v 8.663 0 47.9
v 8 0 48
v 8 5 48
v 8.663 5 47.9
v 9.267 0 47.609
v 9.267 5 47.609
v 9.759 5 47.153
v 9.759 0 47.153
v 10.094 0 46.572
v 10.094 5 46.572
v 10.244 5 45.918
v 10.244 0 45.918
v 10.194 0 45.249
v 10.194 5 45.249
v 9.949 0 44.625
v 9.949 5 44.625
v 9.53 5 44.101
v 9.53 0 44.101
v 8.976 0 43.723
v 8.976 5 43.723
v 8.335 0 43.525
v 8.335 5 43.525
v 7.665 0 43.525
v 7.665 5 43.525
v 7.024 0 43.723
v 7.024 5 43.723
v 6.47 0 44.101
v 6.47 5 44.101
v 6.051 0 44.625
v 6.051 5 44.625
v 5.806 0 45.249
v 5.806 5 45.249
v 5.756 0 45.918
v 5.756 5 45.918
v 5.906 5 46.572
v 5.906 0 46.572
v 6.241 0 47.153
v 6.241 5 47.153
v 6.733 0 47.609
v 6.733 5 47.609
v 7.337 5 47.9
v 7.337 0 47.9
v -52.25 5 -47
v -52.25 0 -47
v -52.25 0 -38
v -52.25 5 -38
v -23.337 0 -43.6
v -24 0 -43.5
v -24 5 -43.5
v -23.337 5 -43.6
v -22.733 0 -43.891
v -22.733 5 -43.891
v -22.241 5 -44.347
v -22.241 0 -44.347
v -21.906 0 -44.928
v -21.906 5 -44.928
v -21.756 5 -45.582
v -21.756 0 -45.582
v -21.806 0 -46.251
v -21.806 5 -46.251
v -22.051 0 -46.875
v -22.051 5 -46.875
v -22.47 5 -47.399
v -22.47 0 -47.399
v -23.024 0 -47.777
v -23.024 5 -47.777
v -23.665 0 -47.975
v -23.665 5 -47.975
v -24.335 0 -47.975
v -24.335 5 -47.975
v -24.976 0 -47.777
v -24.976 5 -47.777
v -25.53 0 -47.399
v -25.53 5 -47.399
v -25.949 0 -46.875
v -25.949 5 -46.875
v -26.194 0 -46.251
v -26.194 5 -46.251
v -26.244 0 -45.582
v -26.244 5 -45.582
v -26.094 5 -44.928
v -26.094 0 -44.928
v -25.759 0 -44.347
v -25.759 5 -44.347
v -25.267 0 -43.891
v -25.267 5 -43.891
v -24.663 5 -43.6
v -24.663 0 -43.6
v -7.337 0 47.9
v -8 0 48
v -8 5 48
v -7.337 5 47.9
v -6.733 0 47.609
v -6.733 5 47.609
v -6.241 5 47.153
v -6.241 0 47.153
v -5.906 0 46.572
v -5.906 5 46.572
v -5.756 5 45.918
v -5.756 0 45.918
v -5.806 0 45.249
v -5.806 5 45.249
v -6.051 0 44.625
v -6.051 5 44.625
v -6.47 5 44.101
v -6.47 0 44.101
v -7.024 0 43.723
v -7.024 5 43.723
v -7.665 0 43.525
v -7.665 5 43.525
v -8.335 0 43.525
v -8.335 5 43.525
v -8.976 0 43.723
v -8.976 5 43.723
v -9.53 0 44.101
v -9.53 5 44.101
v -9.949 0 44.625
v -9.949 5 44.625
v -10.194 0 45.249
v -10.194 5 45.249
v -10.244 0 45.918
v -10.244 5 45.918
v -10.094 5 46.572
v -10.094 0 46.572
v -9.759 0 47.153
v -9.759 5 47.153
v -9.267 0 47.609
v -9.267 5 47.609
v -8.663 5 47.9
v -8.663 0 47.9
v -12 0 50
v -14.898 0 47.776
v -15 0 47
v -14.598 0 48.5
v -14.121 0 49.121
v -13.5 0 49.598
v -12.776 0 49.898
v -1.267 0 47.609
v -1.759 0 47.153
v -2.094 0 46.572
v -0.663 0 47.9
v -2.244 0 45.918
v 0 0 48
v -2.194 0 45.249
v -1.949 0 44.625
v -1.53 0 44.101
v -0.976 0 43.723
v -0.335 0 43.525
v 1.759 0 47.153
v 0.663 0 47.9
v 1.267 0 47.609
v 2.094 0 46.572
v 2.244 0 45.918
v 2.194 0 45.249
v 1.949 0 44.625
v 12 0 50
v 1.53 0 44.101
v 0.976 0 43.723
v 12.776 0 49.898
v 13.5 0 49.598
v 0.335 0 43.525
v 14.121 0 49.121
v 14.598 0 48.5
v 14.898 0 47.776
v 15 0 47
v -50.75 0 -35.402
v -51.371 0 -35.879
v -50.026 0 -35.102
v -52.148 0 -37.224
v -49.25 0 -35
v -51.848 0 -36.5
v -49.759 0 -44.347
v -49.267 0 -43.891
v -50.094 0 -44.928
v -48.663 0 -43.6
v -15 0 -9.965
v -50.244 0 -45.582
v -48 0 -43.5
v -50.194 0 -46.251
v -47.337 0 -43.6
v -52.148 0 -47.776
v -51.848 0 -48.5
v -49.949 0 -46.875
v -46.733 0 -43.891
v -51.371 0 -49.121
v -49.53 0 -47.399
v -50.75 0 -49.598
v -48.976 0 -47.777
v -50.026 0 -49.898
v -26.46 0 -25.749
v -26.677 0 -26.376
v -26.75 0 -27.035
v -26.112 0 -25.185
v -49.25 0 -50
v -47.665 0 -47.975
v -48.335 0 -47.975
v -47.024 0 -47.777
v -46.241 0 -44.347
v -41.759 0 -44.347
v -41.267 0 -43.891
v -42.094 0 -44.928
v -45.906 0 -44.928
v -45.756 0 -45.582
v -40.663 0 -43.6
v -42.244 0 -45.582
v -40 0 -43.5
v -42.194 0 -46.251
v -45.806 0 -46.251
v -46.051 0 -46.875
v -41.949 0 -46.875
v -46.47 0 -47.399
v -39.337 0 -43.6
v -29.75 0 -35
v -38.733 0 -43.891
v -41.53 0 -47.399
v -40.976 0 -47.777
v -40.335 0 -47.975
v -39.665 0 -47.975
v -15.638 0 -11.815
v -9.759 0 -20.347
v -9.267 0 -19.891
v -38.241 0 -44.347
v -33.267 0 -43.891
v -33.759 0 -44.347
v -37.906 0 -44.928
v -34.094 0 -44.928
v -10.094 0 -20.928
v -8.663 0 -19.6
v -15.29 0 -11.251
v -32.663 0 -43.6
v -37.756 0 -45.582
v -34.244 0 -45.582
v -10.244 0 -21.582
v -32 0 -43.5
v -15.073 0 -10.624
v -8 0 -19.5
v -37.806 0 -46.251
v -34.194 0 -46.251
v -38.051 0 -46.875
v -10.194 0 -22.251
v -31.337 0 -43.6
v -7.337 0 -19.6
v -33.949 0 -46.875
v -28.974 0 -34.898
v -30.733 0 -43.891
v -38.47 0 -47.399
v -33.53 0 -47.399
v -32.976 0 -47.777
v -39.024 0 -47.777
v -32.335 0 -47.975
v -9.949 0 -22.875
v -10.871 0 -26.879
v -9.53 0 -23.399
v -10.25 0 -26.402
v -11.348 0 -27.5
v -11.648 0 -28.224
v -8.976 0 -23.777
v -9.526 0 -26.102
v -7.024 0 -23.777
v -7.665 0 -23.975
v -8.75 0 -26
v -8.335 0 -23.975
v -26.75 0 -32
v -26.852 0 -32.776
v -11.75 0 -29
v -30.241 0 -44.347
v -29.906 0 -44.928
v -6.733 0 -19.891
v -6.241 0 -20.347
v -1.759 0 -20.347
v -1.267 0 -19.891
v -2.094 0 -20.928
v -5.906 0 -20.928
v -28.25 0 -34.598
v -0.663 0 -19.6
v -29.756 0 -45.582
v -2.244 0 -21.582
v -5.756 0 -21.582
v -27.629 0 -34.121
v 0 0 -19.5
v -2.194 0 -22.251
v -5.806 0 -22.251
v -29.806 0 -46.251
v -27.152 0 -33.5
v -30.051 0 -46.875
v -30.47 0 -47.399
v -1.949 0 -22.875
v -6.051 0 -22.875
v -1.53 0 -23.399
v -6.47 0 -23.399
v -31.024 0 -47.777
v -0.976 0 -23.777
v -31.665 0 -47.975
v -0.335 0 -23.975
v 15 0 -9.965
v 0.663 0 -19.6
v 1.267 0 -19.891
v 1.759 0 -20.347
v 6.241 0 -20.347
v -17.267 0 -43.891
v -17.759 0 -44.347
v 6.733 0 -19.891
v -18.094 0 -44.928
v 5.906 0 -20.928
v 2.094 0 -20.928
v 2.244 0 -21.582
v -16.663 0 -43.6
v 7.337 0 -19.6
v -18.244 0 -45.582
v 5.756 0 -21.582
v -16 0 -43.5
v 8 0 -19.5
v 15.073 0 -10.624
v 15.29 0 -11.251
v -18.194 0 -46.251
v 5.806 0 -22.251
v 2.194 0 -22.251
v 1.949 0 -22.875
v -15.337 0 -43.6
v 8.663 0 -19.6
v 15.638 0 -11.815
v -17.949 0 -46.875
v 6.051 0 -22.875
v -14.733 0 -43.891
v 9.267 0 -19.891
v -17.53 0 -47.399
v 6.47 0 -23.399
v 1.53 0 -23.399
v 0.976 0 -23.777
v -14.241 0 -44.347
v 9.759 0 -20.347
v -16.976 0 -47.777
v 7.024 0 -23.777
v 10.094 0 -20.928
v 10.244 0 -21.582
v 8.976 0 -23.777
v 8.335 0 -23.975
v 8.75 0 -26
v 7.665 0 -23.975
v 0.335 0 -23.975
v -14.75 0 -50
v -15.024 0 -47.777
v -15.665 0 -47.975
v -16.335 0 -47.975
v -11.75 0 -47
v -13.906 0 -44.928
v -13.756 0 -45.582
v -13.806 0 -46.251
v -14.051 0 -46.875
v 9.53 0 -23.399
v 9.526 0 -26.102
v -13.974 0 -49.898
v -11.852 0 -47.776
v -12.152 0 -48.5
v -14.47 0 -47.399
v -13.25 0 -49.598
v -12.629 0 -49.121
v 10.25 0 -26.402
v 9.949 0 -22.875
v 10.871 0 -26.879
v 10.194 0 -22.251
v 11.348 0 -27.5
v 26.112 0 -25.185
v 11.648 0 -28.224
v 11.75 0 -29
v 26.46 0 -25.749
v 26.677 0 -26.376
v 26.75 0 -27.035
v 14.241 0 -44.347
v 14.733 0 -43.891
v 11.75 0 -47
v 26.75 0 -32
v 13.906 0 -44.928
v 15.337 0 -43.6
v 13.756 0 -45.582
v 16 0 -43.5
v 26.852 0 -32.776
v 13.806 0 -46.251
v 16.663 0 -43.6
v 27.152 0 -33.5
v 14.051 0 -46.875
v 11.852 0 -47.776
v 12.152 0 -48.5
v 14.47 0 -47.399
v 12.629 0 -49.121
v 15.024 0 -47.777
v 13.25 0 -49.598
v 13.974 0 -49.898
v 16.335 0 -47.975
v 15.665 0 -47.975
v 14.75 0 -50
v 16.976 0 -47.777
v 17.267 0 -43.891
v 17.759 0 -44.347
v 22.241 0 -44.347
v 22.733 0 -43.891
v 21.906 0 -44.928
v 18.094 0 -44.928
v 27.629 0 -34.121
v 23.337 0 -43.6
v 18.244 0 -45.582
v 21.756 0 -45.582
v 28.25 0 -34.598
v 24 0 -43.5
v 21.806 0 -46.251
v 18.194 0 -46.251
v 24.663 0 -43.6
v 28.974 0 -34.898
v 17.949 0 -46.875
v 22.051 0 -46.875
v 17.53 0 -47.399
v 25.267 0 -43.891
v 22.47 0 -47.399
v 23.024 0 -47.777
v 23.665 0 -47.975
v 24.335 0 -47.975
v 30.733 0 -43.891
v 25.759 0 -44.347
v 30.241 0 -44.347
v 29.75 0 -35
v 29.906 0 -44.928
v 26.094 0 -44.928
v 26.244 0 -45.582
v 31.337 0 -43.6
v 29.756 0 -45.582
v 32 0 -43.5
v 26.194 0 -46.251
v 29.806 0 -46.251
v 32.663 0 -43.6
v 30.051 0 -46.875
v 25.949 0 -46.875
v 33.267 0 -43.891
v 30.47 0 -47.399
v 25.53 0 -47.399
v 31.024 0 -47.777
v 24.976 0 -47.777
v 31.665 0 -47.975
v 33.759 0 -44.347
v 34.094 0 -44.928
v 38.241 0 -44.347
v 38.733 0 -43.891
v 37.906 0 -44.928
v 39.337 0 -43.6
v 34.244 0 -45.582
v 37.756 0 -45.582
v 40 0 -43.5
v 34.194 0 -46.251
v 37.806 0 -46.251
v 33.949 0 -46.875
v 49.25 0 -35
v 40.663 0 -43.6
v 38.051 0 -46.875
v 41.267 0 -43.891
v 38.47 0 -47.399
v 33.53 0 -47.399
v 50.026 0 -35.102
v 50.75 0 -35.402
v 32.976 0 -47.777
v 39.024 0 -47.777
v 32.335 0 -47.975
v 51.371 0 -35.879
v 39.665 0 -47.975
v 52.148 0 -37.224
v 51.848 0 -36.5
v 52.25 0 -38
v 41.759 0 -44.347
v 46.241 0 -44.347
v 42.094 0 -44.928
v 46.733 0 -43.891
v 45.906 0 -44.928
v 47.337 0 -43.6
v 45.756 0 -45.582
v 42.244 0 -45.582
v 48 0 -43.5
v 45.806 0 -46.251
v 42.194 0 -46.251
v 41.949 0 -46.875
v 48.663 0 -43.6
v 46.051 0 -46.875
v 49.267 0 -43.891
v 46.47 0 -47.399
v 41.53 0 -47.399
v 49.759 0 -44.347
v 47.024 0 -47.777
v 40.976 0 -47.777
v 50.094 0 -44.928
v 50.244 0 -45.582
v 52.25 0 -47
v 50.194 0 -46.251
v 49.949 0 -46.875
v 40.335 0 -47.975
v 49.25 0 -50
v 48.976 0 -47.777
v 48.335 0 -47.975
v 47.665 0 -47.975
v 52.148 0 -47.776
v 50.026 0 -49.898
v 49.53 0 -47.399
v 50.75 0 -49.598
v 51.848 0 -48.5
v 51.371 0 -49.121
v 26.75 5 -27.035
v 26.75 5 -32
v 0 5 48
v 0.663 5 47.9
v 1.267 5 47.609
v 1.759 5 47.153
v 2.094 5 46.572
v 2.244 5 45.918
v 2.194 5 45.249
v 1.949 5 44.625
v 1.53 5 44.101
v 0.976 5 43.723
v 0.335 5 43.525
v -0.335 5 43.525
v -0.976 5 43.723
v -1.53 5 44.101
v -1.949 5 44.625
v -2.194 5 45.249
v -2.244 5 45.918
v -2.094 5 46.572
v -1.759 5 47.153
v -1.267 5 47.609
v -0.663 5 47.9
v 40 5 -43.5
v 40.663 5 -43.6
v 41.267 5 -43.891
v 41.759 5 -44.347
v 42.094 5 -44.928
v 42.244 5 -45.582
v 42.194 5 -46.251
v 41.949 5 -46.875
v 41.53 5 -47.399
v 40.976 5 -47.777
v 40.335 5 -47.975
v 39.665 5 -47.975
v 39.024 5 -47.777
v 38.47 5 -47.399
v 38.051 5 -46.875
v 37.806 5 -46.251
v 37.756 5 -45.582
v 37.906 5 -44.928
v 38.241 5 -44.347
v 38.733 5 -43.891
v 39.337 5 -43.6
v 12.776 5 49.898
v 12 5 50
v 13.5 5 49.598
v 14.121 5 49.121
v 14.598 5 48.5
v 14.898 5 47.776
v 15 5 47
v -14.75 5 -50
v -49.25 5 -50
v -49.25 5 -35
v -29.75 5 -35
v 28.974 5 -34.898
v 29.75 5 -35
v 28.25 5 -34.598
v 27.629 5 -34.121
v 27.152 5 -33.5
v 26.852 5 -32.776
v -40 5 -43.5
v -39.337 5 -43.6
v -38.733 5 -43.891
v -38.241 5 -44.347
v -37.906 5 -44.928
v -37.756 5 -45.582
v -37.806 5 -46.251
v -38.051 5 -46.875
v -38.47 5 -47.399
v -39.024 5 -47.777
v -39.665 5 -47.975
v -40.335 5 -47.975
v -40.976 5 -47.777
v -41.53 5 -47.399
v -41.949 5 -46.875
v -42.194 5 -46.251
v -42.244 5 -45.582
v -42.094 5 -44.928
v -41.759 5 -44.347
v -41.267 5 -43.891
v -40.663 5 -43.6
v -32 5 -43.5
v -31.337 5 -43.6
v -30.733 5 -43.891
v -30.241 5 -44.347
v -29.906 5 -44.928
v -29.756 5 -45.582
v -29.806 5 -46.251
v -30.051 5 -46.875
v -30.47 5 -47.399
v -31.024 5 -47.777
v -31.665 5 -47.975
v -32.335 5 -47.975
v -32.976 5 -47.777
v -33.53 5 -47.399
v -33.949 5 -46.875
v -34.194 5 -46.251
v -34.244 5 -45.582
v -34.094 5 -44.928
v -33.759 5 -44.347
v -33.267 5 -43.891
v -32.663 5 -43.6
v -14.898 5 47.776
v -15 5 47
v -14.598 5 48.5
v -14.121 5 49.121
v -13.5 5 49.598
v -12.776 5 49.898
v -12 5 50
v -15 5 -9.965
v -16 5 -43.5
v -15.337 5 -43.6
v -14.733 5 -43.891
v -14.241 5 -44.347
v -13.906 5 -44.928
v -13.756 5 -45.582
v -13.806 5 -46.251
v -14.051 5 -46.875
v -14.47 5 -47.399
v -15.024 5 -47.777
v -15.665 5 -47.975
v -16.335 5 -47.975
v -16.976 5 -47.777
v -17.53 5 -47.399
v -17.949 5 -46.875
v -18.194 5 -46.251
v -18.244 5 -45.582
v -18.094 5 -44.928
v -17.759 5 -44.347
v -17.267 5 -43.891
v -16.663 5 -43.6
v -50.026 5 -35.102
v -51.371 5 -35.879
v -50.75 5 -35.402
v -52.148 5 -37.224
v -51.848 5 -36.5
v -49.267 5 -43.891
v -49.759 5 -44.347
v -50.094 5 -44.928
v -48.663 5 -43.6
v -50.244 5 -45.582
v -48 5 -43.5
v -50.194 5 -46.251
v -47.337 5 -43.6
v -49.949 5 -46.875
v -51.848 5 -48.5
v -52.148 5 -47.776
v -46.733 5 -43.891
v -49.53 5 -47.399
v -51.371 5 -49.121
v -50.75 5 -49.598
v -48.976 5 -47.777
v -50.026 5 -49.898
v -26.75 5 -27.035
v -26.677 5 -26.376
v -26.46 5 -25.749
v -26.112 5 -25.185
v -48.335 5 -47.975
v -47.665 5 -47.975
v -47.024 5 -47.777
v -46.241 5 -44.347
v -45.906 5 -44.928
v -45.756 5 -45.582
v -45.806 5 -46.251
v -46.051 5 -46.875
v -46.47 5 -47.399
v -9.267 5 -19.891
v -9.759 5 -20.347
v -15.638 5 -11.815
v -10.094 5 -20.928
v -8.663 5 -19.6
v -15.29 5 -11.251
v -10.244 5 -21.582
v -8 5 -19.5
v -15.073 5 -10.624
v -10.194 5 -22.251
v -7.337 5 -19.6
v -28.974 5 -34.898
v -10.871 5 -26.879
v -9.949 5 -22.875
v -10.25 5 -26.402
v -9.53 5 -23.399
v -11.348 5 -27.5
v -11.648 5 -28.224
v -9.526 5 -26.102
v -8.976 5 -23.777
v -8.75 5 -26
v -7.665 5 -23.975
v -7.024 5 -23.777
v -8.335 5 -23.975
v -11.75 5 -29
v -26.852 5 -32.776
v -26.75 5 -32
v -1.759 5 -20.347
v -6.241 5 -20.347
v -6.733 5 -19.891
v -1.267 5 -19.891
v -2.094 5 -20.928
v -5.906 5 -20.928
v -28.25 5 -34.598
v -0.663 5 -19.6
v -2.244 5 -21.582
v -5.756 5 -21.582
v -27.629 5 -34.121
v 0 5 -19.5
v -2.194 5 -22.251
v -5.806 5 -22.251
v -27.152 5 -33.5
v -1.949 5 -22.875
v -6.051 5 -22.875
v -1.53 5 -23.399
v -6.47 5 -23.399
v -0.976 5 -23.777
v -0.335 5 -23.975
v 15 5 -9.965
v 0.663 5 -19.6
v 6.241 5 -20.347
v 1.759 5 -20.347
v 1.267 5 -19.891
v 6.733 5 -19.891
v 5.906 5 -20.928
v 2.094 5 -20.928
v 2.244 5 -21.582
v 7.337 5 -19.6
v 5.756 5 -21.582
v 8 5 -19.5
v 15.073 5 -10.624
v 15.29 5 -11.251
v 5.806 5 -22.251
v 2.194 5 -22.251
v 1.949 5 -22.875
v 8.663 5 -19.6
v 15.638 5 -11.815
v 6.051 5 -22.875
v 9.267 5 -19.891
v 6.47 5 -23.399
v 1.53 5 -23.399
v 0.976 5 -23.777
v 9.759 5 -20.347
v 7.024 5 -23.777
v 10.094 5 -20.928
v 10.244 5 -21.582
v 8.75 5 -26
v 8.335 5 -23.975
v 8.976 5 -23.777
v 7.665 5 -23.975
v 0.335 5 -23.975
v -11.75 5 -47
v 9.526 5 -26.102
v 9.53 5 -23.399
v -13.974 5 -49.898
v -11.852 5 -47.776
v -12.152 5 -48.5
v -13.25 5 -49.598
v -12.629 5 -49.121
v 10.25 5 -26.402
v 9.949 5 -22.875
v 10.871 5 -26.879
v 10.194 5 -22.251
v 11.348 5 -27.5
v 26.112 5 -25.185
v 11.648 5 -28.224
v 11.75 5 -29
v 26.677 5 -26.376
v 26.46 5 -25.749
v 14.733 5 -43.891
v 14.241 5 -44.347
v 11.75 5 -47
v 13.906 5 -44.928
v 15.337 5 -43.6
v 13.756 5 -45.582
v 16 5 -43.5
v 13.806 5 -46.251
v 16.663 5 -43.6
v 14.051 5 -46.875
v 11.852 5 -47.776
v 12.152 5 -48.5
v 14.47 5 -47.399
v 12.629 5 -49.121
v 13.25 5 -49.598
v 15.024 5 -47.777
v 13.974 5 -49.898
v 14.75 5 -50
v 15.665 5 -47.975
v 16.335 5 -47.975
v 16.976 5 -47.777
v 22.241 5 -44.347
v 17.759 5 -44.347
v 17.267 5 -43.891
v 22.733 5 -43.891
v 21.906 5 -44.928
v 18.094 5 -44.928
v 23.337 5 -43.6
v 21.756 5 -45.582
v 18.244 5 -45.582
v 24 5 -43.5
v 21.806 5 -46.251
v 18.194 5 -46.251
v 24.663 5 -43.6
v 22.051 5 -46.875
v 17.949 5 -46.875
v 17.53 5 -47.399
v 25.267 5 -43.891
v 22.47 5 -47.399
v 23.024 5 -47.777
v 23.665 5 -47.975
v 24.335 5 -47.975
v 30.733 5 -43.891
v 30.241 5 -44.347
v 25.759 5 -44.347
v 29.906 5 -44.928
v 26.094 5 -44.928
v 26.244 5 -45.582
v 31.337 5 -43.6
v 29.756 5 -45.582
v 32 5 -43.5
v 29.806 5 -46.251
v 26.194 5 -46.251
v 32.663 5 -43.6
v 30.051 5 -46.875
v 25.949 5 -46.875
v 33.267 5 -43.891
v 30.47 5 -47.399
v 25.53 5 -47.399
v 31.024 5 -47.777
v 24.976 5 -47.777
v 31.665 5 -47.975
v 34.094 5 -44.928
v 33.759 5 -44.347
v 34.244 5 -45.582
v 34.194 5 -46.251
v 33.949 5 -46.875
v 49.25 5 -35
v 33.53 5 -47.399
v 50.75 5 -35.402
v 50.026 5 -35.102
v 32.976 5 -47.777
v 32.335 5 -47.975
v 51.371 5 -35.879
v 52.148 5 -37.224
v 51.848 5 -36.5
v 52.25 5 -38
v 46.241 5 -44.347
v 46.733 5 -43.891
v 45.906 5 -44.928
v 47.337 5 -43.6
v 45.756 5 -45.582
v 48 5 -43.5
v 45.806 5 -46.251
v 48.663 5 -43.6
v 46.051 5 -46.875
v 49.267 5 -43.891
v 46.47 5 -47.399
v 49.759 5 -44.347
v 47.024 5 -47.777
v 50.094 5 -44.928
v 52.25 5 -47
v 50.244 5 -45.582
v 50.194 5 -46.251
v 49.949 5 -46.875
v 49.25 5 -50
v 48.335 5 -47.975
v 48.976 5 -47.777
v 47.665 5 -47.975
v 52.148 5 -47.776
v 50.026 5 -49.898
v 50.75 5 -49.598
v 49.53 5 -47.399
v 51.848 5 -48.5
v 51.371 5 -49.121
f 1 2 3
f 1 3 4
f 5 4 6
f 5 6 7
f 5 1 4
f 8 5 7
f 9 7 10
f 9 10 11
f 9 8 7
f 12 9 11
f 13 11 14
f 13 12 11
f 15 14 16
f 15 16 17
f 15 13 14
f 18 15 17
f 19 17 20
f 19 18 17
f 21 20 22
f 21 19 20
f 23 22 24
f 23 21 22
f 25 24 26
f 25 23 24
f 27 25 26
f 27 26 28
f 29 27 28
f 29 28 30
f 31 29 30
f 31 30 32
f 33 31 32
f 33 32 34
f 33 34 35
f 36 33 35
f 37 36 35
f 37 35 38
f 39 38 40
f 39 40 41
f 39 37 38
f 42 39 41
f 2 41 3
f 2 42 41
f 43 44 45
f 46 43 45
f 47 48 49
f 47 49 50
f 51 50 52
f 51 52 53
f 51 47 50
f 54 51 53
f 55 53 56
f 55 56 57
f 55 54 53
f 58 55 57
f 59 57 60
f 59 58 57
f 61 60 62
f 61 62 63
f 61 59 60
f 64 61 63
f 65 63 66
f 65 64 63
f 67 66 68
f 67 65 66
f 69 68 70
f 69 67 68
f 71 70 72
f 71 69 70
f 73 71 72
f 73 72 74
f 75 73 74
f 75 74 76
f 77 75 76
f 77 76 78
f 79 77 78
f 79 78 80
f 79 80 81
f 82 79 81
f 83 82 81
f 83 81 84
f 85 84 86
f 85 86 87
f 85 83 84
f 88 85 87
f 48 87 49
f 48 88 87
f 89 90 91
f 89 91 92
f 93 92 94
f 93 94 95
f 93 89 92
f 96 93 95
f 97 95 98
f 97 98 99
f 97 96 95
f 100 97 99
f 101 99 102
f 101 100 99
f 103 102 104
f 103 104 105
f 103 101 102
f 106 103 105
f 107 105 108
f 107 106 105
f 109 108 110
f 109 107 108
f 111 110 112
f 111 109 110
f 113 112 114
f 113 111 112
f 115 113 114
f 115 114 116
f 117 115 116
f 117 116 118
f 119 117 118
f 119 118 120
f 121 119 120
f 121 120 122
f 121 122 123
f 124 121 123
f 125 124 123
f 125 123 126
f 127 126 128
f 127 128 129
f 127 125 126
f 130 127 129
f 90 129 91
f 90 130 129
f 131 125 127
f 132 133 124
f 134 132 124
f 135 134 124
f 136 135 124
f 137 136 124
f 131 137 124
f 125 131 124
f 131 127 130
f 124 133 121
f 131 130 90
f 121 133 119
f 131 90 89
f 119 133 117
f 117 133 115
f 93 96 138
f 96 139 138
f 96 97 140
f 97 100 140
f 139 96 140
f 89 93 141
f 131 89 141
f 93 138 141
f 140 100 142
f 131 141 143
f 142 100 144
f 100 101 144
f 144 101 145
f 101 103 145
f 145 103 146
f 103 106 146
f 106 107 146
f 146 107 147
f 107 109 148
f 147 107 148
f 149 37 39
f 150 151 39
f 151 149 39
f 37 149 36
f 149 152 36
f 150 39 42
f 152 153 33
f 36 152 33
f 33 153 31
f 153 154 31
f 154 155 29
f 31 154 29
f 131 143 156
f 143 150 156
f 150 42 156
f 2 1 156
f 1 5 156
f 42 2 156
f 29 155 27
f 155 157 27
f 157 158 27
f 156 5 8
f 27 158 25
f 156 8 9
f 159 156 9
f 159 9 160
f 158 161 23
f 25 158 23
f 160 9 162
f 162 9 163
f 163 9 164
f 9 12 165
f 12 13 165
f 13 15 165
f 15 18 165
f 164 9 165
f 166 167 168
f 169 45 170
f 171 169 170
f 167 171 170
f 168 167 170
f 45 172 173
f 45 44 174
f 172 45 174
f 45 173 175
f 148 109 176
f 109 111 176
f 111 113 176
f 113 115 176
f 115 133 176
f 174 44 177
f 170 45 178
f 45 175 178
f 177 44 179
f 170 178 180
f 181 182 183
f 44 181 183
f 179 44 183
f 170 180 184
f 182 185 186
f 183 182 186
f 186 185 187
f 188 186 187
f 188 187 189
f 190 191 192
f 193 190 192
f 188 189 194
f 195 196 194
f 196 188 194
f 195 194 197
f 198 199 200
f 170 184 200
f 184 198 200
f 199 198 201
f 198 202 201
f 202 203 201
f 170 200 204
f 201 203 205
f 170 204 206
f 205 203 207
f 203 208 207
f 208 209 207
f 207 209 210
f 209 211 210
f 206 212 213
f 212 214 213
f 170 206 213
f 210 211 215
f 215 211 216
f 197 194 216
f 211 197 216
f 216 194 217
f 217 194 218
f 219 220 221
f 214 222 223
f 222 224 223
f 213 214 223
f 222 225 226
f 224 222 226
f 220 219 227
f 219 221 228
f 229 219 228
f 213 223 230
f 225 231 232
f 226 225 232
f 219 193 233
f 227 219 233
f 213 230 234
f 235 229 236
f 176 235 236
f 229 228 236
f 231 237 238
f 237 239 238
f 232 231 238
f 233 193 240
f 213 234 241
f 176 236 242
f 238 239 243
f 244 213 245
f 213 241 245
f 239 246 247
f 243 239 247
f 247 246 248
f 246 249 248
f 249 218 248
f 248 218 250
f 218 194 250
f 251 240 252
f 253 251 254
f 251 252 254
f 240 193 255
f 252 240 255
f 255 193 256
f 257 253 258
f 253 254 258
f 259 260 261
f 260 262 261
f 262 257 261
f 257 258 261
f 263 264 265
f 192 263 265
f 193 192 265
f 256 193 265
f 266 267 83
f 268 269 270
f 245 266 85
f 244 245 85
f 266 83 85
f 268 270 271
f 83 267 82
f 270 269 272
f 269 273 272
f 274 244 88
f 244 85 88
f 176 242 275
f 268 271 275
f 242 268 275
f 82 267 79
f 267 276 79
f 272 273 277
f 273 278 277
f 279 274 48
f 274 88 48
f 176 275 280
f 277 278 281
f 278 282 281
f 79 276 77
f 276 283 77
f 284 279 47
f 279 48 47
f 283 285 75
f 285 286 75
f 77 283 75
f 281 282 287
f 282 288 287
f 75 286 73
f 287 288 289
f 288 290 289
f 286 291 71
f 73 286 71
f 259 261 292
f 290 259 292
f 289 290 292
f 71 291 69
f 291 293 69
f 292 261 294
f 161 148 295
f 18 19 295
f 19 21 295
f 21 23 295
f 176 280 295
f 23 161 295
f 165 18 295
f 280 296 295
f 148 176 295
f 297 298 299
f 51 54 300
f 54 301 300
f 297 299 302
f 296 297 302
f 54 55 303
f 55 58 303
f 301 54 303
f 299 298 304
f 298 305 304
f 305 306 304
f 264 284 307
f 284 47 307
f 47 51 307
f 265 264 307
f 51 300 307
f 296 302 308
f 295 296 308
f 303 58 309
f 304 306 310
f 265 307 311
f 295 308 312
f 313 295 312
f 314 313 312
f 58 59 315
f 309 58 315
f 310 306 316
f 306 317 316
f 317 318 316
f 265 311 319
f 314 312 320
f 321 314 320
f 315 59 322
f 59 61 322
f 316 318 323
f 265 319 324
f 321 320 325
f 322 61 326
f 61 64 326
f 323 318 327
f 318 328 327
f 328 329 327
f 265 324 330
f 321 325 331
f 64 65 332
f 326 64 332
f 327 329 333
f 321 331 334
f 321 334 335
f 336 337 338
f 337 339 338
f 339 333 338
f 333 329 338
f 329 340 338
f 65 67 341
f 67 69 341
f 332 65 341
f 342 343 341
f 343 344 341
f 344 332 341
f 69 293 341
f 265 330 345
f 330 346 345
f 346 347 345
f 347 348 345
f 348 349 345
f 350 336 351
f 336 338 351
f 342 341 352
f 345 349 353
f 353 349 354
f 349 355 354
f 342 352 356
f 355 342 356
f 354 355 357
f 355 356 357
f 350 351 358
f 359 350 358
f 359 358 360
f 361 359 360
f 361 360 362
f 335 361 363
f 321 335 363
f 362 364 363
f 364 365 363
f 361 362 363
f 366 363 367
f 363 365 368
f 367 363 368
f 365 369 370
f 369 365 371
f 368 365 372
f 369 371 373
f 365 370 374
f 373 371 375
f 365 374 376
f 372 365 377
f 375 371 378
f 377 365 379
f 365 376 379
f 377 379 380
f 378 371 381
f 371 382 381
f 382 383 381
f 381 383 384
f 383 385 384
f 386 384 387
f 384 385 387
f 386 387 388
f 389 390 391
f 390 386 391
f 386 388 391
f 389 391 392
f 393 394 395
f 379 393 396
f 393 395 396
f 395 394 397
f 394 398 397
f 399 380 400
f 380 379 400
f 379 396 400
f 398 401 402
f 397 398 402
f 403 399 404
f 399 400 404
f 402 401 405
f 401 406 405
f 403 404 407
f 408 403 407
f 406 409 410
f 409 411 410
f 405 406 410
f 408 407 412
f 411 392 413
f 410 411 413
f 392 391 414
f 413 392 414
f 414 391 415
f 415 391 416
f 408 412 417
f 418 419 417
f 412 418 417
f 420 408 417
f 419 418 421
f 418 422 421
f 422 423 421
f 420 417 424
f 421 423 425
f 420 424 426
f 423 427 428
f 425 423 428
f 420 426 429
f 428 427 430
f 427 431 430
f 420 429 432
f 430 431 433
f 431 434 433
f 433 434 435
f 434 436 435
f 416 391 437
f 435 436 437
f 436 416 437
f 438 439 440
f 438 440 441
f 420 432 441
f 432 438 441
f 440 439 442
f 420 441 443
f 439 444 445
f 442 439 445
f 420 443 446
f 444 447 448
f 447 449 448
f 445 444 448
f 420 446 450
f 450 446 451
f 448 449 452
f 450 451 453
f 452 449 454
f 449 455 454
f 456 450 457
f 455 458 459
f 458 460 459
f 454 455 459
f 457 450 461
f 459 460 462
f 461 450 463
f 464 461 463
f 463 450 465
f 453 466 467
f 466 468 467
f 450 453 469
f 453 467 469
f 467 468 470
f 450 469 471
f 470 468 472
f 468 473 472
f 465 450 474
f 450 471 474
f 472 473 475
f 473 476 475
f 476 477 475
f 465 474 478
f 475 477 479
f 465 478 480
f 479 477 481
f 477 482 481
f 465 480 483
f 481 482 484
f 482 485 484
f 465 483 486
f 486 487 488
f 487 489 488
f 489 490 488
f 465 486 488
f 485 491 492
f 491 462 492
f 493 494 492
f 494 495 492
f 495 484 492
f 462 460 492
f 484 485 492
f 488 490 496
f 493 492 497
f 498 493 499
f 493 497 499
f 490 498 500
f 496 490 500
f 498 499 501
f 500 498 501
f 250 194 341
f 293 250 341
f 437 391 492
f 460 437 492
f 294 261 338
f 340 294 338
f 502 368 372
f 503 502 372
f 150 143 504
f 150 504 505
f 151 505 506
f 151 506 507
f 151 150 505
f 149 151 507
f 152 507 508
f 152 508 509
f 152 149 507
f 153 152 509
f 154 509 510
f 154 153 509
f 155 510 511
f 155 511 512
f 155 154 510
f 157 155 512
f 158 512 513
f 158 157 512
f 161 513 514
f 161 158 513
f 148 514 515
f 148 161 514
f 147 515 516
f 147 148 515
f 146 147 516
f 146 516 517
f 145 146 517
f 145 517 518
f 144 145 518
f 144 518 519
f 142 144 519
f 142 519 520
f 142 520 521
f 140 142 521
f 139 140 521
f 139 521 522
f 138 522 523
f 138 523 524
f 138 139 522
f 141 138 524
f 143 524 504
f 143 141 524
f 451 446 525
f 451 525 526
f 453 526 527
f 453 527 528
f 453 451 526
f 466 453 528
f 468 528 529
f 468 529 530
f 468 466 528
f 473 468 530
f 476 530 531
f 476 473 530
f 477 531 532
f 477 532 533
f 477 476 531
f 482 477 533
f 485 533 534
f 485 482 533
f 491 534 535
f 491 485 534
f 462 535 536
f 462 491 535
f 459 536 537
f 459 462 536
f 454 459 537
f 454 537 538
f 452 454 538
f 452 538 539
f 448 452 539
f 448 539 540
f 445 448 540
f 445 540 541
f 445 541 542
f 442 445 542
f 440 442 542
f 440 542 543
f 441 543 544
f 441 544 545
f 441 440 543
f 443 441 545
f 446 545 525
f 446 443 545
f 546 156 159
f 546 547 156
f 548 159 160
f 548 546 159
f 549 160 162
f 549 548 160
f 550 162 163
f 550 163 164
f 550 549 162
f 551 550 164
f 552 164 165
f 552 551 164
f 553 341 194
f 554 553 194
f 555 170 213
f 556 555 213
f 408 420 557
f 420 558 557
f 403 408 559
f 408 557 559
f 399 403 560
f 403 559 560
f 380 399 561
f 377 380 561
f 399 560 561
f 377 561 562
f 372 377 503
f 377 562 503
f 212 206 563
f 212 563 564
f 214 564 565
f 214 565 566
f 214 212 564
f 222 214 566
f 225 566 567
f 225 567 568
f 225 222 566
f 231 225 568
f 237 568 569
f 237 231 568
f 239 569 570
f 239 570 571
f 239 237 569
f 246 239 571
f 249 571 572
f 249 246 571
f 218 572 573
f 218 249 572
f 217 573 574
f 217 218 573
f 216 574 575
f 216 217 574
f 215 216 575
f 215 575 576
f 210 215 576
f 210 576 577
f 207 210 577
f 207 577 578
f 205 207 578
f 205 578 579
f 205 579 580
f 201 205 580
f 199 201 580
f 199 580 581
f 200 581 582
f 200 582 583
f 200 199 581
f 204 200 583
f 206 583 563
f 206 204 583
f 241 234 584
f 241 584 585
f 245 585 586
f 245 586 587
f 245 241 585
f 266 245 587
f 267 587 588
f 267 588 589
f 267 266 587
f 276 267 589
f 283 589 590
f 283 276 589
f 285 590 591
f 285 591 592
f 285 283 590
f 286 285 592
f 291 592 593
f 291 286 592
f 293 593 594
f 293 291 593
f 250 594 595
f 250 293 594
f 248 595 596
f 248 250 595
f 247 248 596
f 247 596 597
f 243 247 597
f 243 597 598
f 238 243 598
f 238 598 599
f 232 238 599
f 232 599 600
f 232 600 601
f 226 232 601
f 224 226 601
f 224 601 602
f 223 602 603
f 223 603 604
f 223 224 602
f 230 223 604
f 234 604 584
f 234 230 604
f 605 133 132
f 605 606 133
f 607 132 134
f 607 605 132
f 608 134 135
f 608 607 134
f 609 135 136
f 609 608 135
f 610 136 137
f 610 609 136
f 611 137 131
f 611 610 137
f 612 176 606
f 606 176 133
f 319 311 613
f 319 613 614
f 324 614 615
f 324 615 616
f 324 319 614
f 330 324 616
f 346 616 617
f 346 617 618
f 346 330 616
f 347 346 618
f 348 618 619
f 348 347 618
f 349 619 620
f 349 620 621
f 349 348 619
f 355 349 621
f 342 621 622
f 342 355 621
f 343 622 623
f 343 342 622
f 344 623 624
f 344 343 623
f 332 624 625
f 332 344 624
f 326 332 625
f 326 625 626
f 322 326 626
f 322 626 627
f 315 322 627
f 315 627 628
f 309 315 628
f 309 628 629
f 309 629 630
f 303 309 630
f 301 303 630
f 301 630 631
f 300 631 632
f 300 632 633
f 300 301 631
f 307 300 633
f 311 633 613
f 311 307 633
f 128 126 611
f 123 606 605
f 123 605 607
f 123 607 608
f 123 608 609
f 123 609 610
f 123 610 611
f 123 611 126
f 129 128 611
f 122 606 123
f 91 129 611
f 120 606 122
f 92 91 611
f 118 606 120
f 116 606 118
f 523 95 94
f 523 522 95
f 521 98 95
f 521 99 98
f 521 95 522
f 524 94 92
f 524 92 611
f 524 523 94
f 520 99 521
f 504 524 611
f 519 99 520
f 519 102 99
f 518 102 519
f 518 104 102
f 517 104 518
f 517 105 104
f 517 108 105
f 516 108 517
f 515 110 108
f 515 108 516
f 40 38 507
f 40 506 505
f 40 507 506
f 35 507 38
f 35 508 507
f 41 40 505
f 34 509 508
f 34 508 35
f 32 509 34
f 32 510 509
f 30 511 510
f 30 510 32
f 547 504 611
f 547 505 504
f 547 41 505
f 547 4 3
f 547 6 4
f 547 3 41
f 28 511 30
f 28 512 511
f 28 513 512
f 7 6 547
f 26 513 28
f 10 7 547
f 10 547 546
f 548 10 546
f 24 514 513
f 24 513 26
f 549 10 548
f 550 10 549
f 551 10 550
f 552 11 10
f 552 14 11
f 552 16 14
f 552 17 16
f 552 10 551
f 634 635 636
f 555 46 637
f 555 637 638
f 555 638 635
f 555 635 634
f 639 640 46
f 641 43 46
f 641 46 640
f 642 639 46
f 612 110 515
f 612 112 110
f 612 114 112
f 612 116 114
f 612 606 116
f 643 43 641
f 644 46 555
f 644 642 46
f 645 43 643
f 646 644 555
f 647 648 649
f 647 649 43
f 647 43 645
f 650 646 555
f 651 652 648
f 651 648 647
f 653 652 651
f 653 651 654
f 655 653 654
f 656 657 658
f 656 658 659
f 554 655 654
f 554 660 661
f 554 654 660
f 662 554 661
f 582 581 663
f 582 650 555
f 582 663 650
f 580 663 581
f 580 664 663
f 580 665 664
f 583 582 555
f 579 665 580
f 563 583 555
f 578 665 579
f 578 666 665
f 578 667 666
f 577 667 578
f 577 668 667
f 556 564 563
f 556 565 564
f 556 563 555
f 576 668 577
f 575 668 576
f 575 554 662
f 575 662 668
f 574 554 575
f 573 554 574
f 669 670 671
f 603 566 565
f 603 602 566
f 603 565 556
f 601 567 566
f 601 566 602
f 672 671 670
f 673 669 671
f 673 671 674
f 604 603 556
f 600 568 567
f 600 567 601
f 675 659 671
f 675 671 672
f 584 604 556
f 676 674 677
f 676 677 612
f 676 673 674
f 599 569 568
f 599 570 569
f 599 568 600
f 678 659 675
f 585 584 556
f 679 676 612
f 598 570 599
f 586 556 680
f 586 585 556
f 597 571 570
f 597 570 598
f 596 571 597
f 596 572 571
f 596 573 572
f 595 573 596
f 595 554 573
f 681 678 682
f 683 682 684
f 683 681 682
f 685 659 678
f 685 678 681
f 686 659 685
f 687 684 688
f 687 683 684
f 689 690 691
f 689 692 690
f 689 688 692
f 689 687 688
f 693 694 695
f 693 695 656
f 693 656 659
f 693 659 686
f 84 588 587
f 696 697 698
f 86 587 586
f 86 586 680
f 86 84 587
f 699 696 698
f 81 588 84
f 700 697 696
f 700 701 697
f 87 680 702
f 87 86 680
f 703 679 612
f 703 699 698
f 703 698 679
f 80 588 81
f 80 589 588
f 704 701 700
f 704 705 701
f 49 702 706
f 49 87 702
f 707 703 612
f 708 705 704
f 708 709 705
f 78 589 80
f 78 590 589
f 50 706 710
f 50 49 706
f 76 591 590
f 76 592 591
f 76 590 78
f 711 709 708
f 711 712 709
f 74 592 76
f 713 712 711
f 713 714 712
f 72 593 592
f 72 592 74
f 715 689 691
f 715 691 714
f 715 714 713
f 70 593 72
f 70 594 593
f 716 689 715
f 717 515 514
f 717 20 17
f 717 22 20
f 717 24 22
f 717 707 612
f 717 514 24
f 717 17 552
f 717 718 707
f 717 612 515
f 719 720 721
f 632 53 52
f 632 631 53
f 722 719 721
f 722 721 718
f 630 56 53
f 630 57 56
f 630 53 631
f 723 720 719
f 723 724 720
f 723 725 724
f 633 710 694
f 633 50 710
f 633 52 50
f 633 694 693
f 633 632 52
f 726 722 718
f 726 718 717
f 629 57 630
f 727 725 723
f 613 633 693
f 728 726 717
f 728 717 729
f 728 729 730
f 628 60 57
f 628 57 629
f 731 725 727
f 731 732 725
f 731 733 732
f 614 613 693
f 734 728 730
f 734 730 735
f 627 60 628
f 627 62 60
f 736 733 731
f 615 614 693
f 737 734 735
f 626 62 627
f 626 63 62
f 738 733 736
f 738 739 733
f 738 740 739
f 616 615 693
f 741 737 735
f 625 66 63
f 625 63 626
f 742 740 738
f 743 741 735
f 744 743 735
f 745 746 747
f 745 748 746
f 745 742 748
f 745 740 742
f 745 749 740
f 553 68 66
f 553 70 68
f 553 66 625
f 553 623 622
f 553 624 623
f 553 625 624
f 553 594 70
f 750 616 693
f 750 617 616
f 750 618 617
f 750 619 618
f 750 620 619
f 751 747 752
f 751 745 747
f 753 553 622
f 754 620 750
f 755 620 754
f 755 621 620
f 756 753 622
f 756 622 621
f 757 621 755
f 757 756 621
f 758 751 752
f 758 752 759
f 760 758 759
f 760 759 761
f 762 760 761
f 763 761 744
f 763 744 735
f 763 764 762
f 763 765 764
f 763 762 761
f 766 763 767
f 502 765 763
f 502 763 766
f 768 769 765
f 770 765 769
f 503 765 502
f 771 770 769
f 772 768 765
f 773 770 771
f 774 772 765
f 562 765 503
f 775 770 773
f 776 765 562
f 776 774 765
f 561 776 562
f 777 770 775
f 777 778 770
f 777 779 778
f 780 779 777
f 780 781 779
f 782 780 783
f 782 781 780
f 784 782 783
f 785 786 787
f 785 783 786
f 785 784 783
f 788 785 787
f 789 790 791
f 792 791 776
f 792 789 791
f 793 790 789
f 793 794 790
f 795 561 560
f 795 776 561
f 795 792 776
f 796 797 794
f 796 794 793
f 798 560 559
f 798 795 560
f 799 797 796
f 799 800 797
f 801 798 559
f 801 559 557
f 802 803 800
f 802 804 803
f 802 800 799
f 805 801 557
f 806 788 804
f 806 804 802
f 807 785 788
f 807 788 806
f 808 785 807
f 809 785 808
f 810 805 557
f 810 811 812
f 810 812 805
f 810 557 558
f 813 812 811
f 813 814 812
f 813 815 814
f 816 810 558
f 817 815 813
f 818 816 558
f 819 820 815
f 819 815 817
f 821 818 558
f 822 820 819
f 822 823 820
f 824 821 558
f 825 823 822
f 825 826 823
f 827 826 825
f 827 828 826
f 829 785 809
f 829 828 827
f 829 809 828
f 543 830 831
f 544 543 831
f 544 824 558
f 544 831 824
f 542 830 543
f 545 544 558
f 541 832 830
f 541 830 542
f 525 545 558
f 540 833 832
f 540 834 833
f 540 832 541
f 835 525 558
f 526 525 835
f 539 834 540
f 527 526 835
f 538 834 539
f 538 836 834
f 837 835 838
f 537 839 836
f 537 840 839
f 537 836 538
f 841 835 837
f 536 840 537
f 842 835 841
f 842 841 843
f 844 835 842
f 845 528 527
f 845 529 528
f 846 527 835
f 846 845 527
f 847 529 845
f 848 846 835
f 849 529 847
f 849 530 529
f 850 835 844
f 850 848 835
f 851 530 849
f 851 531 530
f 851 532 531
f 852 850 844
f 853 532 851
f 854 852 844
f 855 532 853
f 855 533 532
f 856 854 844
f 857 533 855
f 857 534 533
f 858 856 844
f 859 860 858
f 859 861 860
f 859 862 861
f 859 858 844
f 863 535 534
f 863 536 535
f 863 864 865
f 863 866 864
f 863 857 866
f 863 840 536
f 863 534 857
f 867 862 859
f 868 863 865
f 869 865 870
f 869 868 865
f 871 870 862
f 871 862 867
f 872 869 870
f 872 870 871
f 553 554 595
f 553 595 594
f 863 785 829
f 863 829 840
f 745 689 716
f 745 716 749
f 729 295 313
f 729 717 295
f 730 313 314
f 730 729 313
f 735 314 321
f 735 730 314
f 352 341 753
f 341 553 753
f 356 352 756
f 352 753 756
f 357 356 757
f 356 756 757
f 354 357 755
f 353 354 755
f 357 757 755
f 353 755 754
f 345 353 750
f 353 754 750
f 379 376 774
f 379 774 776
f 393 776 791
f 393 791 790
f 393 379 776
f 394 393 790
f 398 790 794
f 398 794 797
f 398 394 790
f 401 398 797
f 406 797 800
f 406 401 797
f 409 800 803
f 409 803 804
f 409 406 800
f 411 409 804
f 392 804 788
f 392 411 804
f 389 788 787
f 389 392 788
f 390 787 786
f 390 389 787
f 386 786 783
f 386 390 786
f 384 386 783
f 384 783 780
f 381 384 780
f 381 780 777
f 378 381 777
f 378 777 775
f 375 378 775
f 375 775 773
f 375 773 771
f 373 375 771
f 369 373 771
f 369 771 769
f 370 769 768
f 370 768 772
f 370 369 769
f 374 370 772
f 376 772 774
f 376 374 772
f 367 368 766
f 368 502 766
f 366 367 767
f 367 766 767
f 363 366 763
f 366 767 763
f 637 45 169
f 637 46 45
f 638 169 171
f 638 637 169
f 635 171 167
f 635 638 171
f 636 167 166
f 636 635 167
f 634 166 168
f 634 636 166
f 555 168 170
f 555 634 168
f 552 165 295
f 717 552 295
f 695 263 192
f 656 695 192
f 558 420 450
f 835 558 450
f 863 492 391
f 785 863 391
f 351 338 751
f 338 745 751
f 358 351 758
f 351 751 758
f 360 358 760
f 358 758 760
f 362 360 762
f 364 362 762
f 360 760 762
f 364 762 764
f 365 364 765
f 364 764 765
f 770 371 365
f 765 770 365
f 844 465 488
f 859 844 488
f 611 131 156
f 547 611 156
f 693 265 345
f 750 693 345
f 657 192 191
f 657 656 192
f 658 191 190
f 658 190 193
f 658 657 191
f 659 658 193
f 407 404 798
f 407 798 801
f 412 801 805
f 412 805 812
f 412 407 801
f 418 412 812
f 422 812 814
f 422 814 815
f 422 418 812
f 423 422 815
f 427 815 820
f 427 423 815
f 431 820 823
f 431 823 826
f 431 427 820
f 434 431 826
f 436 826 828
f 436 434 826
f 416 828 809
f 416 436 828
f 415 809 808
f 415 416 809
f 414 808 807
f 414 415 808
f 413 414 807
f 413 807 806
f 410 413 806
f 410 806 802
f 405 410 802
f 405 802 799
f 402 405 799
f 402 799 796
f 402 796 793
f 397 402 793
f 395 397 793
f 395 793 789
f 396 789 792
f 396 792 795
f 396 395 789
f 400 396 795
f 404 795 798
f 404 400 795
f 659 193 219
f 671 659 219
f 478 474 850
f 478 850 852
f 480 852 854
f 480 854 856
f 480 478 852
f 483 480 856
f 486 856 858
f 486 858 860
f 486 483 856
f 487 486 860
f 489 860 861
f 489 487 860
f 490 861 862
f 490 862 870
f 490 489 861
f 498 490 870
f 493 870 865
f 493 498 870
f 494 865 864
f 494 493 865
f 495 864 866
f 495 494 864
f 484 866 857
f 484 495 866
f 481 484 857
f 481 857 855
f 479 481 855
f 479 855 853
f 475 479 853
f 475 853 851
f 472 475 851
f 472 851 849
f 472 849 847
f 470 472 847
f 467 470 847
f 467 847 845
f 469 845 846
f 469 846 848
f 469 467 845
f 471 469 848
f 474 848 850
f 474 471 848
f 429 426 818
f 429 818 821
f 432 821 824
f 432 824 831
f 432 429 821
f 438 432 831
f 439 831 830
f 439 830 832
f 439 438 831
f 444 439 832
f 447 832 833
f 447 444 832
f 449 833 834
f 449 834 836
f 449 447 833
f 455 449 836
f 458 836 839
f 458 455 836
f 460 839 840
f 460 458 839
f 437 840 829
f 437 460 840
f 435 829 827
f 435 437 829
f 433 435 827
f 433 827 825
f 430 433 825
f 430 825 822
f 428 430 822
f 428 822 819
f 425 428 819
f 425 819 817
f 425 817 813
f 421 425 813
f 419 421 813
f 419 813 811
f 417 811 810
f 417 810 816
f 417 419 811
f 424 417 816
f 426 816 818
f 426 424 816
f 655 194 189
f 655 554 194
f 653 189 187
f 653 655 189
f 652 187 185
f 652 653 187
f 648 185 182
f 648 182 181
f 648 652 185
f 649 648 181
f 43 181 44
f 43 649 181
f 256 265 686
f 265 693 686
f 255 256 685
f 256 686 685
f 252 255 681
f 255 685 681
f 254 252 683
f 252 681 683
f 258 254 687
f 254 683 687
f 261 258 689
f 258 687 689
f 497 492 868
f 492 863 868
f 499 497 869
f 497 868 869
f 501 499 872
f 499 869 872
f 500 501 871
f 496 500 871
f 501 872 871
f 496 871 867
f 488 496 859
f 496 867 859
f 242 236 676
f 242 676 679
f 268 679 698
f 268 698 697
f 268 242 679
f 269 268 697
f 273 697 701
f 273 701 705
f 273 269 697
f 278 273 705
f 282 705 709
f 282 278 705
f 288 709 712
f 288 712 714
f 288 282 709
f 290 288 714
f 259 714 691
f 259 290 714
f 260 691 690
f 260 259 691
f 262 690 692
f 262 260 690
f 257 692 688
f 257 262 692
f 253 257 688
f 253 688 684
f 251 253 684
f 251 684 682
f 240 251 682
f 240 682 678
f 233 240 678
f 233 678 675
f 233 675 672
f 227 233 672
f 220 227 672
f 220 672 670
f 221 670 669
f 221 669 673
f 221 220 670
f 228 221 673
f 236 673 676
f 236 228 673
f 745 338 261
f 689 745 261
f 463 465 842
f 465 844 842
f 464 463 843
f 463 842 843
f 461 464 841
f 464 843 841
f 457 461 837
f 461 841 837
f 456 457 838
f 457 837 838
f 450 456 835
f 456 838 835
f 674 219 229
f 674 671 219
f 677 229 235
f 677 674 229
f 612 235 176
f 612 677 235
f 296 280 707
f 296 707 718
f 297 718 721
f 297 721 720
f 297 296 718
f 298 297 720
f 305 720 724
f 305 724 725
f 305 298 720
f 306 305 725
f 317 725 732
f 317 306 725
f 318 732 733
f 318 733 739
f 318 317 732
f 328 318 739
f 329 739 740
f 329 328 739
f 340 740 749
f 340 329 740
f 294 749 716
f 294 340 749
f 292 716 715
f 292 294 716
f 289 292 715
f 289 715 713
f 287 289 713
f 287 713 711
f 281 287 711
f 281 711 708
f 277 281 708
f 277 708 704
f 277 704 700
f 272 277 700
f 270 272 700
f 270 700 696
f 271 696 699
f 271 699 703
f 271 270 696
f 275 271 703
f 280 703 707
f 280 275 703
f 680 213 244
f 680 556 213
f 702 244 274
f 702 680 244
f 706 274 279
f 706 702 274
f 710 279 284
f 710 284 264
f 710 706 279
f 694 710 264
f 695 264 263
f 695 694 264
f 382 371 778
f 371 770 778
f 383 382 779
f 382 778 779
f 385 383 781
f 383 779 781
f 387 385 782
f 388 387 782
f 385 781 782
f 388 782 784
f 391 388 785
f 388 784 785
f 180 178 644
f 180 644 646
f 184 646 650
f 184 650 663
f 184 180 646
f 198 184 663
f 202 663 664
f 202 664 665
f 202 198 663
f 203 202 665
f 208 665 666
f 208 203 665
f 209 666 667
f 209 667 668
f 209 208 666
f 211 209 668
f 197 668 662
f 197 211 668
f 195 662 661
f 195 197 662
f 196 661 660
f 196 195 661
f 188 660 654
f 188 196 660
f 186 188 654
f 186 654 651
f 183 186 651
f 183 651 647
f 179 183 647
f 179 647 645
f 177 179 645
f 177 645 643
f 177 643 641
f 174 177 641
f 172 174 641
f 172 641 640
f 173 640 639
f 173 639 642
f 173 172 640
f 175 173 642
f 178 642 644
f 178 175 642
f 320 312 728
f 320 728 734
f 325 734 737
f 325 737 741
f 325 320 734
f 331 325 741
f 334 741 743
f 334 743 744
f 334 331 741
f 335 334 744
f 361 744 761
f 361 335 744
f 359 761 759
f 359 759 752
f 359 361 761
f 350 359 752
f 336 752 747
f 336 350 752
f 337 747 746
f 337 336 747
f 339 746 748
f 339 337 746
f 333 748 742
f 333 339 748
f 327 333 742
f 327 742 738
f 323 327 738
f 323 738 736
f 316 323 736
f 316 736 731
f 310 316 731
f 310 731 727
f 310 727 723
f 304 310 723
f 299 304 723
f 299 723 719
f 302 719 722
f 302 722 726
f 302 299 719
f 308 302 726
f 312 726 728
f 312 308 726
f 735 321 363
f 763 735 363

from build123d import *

# Parameters (mm, degrees)
SKETCH_2_R      = 2.25
EXTRUDE_1_DEPTH = 5
FILLET_1_R      = 3


with BuildPart() as part:
    # 草图2 → 凸台-拉伸1 (new body)
    with BuildSketch(Plane(origin=(0, 0, 0), x_dir=(1, 0, 0), z_dir=(0, 1, 0))):
        Polygon((-11.75, 50), (-52.25, 50), (-52.25, 35), (-26.75, 35), (-26.75, 26), (-15, 11), (-15, -50), (15, -50), (15, 11), (26.75, 26), (26.75, 35), (52.25, 35), (52.25, 50), (11.75, 50), (11.75, 26), (-11.75, 26), align=None)
        with Locations(Location((-8, -45.75, 0), (0, 0, 270))):
            Circle(SKETCH_2_R, mode=Mode.SUBTRACT)
        with Locations(Location((0, -45.75, 0), (0, 0, 270))):
            Circle(SKETCH_2_R, mode=Mode.SUBTRACT)
        with Locations(Location((8, -45.75, 0), (0, 0, 270))):
            Circle(SKETCH_2_R, mode=Mode.SUBTRACT)
        with Locations(Location((-8, 21.75, 0), (0, 0, 270))):
            Circle(SKETCH_2_R, mode=Mode.SUBTRACT)
        with Locations(Location((-48, 45.75, 0), (0, 0, 270))):
            Circle(SKETCH_2_R, mode=Mode.SUBTRACT)
        with Locations(Location((-40, 45.75, 0), (0, 0, 270))):
            Circle(SKETCH_2_R, mode=Mode.SUBTRACT)
        with Locations(Location((-32, 45.75, 0), (0, 0, 270))):
            Circle(SKETCH_2_R, mode=Mode.SUBTRACT)
        with Locations(Location((-24, 45.75, 0), (0, 0, 270))):
            Circle(SKETCH_2_R, mode=Mode.SUBTRACT)
        with Locations(Location((-16, 45.75, 0), (0, 0, 270))):
            Circle(SKETCH_2_R, mode=Mode.SUBTRACT)
        with Locations(Location((0, 21.75, 0), (0, 0, 270))):
            Circle(SKETCH_2_R, mode=Mode.SUBTRACT)
        with Locations(Location((8, 21.75, 0), (0, 0, 270))):
            Circle(SKETCH_2_R, mode=Mode.SUBTRACT)
        with Locations(Location((16, 45.75, 0), (0, 0, 270))):
            Circle(SKETCH_2_R, mode=Mode.SUBTRACT)
        with Locations(Location((24, 45.75, 0), (0, 0, 270))):
            Circle(SKETCH_2_R, mode=Mode.SUBTRACT)
        with Locations(Location((32, 45.75, 0), (0, 0, 270))):
            Circle(SKETCH_2_R, mode=Mode.SUBTRACT)
        with Locations(Location((40, 45.75, 0), (0, 0, 270))):
            Circle(SKETCH_2_R, mode=Mode.SUBTRACT)
        with Locations(Location((48, 45.75, 0), (0, 0, 270))):
            Circle(SKETCH_2_R, mode=Mode.SUBTRACT)
    extrude(amount=EXTRUDE_1_DEPTH)

    # 圆角1
    fillet_1_edges = [part.edges().sort_by_distance(p)[0] for p in [
        (15, 2.5, -11),
        (15, 2.5, 50),
        (-15, 2.5, 50),
        (-15, 2.5, -11),
        (-26.75, 2.5, -26),
        (-26.75, 2.5, -35),
        (-52.25, 2.5, -35),
        (-52.25, 2.5, -50),
        (-11.75, 2.5, -50),
        (-11.75, 2.5, -26),
        (11.75, 2.5, -26),
        (11.75, 2.5, -50),
        (52.25, 2.5, -50),
        (52.25, 2.5, -35),
        (26.75, 2.5, -35),
        (26.75, 2.5, -26),
    ]]
    fillet(fillet_1_edges, radius=FILLET_1_R)


solid = part.part
